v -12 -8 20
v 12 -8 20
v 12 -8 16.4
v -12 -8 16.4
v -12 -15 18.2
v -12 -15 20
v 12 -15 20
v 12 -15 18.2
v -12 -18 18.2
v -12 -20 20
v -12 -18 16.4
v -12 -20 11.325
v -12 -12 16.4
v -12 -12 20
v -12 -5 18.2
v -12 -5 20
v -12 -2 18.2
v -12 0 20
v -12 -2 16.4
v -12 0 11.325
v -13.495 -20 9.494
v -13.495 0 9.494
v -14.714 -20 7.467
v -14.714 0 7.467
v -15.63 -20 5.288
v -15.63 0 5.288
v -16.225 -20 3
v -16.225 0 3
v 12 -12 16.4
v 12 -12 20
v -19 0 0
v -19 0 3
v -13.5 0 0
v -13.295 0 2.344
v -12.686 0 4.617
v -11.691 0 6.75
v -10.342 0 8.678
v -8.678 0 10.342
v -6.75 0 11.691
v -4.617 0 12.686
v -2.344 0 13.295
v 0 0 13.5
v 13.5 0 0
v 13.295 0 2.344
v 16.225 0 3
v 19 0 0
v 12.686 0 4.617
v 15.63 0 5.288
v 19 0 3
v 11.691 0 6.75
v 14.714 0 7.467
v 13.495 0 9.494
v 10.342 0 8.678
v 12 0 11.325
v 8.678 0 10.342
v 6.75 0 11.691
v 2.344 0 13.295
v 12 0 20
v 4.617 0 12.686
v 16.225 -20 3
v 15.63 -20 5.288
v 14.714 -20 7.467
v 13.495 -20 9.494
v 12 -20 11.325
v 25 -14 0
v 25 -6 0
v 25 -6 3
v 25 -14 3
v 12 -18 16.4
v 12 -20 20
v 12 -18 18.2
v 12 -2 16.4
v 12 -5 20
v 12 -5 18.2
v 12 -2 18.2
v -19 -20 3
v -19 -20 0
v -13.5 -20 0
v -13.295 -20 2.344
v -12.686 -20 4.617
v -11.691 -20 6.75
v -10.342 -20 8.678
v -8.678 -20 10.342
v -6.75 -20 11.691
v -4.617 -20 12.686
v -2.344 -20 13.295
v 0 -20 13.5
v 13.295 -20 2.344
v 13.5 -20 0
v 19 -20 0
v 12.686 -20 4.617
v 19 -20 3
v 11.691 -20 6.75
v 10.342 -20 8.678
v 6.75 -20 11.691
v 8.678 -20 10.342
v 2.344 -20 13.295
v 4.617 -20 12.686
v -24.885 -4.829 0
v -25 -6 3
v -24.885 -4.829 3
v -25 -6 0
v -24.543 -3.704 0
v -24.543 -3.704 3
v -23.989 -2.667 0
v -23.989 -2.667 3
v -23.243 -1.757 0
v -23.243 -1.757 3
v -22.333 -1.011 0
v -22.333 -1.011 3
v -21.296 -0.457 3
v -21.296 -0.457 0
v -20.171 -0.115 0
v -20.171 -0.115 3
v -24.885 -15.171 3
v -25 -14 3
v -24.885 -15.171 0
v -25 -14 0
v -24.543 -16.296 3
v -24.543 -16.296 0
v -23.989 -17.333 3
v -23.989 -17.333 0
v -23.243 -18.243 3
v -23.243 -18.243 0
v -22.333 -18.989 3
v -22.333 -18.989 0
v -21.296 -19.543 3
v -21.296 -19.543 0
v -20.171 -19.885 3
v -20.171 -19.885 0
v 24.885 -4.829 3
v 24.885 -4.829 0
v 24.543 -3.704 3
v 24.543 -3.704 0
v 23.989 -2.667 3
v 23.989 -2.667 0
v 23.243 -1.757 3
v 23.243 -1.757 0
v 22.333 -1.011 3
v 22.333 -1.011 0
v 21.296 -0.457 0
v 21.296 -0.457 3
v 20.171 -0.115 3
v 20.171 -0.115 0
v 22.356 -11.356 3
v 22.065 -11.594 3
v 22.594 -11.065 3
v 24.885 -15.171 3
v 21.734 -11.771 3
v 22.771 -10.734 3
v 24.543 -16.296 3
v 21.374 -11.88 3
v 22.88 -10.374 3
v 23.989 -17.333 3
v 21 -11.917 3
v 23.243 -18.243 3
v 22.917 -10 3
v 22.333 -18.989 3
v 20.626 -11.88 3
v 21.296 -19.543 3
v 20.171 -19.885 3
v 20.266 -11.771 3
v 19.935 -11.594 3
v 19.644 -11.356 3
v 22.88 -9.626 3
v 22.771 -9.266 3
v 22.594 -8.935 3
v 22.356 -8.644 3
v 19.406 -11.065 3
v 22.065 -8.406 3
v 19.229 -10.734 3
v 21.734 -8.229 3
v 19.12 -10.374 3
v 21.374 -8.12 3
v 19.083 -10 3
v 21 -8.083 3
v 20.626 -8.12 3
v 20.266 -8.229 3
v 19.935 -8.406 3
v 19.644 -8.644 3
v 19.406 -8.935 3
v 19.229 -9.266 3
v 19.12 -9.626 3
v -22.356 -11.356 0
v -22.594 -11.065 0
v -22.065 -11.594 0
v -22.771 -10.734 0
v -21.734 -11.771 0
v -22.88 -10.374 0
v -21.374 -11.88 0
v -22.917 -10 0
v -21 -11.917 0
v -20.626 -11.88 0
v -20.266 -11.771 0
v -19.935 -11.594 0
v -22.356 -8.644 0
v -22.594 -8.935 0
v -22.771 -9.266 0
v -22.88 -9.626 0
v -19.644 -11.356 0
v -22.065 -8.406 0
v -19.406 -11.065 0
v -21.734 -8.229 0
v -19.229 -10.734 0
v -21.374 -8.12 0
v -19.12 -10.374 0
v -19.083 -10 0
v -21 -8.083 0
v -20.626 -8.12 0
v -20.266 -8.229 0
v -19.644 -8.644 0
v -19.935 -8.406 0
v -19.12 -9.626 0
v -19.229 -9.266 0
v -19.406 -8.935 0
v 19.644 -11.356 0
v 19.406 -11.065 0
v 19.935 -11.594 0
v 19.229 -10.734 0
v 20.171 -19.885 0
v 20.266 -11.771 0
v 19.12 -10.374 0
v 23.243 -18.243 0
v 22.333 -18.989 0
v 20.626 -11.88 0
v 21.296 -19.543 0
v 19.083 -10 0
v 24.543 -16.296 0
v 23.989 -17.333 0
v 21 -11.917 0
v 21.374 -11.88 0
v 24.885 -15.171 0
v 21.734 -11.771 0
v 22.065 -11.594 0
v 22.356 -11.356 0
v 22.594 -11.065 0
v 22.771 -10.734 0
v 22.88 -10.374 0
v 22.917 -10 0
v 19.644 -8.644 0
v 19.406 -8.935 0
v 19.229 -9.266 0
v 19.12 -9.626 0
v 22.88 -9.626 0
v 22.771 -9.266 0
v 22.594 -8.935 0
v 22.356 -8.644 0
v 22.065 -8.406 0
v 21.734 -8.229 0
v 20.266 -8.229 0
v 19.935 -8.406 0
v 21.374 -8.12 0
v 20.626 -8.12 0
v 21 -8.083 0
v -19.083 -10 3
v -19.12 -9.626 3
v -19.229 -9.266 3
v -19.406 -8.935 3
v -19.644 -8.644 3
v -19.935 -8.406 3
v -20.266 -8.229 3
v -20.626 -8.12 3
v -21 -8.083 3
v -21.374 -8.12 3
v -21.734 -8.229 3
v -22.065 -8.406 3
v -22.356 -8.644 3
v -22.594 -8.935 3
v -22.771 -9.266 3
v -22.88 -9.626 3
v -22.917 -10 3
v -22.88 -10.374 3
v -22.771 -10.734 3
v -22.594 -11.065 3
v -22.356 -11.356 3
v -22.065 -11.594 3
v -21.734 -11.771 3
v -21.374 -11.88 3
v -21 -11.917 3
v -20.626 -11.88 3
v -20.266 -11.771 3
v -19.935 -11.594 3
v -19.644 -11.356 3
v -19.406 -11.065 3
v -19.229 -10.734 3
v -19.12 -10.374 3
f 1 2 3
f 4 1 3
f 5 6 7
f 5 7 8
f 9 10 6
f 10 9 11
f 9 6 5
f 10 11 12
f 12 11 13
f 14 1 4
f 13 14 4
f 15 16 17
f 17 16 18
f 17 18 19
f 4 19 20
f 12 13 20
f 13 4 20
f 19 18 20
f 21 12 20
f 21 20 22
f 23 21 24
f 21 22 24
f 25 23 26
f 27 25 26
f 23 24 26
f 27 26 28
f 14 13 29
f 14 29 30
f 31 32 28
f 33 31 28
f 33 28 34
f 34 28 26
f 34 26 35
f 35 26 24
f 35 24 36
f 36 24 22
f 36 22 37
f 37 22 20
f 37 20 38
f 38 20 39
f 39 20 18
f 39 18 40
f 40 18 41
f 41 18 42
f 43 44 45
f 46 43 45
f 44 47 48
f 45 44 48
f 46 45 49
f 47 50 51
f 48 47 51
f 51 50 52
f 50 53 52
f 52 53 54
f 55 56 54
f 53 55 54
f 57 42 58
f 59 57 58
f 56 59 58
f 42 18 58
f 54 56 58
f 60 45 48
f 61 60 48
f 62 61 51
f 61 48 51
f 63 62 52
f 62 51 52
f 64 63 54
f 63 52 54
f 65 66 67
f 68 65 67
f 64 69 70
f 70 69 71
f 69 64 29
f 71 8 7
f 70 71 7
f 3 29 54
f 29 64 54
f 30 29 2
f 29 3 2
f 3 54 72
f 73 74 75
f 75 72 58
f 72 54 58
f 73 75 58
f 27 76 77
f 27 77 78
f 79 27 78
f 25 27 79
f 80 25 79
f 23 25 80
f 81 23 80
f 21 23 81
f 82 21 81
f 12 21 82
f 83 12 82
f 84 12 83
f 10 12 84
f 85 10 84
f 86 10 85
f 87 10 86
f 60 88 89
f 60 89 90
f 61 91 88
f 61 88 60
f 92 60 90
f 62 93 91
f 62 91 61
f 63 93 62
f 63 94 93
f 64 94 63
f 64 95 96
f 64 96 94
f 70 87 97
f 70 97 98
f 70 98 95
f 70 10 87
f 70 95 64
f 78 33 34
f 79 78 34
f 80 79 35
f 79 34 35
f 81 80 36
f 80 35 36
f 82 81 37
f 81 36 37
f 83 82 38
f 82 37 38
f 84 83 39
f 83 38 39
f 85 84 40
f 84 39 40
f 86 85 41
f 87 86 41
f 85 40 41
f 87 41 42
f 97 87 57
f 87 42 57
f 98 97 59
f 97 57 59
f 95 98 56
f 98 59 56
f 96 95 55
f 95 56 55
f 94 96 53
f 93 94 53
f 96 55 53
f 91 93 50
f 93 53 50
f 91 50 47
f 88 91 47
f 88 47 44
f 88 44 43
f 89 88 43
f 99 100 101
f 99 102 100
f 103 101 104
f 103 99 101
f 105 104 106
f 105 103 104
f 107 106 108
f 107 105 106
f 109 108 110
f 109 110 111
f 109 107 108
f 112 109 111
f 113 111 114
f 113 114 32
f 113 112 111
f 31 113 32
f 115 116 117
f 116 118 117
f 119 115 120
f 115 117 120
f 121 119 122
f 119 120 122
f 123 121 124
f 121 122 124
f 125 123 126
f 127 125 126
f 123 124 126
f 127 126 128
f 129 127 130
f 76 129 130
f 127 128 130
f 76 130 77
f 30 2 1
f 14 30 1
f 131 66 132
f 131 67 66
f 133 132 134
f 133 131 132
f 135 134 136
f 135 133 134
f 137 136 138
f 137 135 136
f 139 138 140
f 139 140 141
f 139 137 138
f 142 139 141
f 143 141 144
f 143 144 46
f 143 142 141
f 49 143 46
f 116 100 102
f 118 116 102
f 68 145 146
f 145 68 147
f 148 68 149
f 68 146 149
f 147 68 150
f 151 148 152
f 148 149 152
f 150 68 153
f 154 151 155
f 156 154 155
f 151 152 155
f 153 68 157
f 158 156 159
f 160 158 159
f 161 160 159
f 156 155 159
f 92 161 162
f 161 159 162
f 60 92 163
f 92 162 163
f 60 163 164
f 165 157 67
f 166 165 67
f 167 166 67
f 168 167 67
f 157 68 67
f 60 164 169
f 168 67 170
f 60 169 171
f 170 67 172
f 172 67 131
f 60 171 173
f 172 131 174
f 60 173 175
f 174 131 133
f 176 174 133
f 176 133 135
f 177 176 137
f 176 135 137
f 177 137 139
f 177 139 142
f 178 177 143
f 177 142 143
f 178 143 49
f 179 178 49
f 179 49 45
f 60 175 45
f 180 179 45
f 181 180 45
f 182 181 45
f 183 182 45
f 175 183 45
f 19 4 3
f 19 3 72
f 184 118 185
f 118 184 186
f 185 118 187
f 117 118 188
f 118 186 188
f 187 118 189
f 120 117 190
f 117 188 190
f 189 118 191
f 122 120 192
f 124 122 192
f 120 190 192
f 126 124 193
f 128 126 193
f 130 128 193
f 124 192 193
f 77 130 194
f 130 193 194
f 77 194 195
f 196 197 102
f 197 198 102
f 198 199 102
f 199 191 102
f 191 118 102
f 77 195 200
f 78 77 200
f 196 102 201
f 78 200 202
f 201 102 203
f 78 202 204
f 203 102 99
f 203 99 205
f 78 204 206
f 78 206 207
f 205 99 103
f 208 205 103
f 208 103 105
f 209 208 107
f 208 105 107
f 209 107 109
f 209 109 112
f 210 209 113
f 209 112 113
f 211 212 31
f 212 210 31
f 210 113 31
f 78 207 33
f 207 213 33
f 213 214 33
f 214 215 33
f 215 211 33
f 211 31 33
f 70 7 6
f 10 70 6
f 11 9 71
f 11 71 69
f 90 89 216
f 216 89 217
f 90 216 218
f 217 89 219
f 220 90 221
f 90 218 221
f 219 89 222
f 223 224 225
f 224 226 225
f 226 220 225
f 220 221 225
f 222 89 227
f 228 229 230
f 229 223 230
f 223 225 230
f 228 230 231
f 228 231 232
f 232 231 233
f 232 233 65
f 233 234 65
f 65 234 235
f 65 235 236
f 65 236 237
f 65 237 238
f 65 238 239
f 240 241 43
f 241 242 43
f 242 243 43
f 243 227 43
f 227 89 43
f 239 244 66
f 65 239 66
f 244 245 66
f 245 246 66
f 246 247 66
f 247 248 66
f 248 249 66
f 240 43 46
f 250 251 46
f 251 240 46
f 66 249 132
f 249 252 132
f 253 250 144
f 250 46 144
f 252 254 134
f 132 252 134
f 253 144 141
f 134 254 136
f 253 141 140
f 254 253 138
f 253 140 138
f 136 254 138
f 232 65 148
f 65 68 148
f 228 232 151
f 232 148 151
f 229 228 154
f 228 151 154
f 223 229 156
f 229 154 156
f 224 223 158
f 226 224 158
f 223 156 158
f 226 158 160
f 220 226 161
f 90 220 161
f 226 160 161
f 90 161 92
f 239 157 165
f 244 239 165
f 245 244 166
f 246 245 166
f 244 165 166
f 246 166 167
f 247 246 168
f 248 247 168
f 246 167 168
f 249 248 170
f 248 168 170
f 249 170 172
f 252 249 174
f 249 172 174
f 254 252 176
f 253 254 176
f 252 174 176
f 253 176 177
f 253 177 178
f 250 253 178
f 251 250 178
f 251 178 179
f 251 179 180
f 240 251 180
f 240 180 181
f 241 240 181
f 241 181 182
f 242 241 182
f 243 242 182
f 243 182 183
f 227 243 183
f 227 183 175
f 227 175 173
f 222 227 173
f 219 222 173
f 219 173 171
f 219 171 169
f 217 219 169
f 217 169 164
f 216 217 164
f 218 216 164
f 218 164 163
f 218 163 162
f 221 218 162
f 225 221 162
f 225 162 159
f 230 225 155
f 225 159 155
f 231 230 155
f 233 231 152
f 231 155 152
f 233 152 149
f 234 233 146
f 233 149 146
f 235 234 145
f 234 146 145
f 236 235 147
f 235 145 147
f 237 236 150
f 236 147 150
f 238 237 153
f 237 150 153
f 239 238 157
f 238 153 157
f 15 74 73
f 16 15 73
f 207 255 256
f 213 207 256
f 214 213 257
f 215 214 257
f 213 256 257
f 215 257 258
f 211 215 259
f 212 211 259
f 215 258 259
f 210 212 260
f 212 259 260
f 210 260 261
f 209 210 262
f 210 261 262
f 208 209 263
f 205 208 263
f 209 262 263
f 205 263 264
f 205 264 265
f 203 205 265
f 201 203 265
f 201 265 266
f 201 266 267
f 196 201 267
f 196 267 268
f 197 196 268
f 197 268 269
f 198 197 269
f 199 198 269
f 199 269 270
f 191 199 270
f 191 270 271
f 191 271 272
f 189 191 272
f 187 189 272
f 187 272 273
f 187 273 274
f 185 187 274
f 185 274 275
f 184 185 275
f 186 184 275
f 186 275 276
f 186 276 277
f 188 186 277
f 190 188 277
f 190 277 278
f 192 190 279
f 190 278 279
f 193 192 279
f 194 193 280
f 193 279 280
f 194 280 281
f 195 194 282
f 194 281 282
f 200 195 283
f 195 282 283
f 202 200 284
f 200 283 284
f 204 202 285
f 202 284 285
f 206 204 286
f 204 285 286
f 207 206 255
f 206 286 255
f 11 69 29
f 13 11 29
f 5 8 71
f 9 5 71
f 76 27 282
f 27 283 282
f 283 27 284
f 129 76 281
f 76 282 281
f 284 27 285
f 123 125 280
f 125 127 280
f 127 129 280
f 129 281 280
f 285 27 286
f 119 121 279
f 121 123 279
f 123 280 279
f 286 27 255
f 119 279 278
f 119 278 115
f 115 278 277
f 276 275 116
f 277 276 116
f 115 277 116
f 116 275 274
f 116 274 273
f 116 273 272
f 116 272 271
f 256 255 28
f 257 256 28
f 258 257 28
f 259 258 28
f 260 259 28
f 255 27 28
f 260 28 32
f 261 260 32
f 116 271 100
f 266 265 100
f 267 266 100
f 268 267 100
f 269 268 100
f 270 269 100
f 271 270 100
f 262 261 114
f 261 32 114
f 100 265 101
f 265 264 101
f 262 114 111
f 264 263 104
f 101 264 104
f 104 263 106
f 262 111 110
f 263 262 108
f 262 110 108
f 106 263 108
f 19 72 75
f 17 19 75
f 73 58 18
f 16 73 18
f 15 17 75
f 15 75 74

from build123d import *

# Parameters (mm, degrees)
F1_DEPTH = 20
F2_R     = 6
F3_R     = 1.917143
F4_DEPTH = 25
F6_DEPTH = 20
F8_DEPTH = 12.5


with BuildPart() as f1:
    # F0 (on Front) → F1 (new body)
    with BuildSketch(Plane.XZ):
        with BuildLine():
            Line((-25, 3), (-25, 0))
            Line((-25, 0), (-13.5, 0))
            ThreePointArc((-13.5, 0), (0, 13.5), (13.5, 0))
            Line((13.5, 0), (25, 0))
            Line((25, 0), (25, 3))
            Line((25, 3), (16.224981, 3))
            ThreePointArc((16.224981, 3), (0, 16.5), (-16.224981, 3))
            Line((-16.224981, 3), (-25, 3))
        make_face()
    extrude(amount=F1_DEPTH)

    # F2
    f2_edges = [f1.edges().sort_by_distance(p)[0] for p in [
        (25, -20, 1.5),
        (25, 0, 1.5),
        (-25, -20, 1.5),
        (-25, 0, 1.5),
    ]]
    fillet(f2_edges, radius=F2_R)

    # F3 (on face) → F4 (cut)
    with BuildSketch(Plane.XY.offset(3)):
        with Locations((-21, -10)):
            Circle(F3_R)
        with Locations((21, -10)):
            Circle(F3_R)
    extrude(amount=-F4_DEPTH, mode=Mode.SUBTRACT)

    # F5 (on Front) → F6 (join)
    with BuildSketch(Plane.XZ):
        with BuildLine():
            Line((12, 20), (-12, 20))
            Line((-12, 20), (-12, 10.583005))
            ThreePointArc((-12, 10.583005), (0, 16), (12, 10.583005))
            Line((12, 10.583005), (12, 20))
        make_face()
    extrude(amount=F6_DEPTH)

    # F7 (on Right) → F8 (cut, symmetric)
    with BuildSketch(Plane.YZ):
        Polygon((-12, 20), (-15, 20), (-15, 18.2), (-18, 18.2), (-18, 16.4), (-12, 16.4), align=None)
        Polygon((-5, 20), (-8, 20), (-8, 16.4), (-2, 16.4), (-2, 18.2), (-5, 18.2), align=None)
    extrude(amount=F8_DEPTH, both=True, mode=Mode.SUBTRACT)


solid = f1.part
